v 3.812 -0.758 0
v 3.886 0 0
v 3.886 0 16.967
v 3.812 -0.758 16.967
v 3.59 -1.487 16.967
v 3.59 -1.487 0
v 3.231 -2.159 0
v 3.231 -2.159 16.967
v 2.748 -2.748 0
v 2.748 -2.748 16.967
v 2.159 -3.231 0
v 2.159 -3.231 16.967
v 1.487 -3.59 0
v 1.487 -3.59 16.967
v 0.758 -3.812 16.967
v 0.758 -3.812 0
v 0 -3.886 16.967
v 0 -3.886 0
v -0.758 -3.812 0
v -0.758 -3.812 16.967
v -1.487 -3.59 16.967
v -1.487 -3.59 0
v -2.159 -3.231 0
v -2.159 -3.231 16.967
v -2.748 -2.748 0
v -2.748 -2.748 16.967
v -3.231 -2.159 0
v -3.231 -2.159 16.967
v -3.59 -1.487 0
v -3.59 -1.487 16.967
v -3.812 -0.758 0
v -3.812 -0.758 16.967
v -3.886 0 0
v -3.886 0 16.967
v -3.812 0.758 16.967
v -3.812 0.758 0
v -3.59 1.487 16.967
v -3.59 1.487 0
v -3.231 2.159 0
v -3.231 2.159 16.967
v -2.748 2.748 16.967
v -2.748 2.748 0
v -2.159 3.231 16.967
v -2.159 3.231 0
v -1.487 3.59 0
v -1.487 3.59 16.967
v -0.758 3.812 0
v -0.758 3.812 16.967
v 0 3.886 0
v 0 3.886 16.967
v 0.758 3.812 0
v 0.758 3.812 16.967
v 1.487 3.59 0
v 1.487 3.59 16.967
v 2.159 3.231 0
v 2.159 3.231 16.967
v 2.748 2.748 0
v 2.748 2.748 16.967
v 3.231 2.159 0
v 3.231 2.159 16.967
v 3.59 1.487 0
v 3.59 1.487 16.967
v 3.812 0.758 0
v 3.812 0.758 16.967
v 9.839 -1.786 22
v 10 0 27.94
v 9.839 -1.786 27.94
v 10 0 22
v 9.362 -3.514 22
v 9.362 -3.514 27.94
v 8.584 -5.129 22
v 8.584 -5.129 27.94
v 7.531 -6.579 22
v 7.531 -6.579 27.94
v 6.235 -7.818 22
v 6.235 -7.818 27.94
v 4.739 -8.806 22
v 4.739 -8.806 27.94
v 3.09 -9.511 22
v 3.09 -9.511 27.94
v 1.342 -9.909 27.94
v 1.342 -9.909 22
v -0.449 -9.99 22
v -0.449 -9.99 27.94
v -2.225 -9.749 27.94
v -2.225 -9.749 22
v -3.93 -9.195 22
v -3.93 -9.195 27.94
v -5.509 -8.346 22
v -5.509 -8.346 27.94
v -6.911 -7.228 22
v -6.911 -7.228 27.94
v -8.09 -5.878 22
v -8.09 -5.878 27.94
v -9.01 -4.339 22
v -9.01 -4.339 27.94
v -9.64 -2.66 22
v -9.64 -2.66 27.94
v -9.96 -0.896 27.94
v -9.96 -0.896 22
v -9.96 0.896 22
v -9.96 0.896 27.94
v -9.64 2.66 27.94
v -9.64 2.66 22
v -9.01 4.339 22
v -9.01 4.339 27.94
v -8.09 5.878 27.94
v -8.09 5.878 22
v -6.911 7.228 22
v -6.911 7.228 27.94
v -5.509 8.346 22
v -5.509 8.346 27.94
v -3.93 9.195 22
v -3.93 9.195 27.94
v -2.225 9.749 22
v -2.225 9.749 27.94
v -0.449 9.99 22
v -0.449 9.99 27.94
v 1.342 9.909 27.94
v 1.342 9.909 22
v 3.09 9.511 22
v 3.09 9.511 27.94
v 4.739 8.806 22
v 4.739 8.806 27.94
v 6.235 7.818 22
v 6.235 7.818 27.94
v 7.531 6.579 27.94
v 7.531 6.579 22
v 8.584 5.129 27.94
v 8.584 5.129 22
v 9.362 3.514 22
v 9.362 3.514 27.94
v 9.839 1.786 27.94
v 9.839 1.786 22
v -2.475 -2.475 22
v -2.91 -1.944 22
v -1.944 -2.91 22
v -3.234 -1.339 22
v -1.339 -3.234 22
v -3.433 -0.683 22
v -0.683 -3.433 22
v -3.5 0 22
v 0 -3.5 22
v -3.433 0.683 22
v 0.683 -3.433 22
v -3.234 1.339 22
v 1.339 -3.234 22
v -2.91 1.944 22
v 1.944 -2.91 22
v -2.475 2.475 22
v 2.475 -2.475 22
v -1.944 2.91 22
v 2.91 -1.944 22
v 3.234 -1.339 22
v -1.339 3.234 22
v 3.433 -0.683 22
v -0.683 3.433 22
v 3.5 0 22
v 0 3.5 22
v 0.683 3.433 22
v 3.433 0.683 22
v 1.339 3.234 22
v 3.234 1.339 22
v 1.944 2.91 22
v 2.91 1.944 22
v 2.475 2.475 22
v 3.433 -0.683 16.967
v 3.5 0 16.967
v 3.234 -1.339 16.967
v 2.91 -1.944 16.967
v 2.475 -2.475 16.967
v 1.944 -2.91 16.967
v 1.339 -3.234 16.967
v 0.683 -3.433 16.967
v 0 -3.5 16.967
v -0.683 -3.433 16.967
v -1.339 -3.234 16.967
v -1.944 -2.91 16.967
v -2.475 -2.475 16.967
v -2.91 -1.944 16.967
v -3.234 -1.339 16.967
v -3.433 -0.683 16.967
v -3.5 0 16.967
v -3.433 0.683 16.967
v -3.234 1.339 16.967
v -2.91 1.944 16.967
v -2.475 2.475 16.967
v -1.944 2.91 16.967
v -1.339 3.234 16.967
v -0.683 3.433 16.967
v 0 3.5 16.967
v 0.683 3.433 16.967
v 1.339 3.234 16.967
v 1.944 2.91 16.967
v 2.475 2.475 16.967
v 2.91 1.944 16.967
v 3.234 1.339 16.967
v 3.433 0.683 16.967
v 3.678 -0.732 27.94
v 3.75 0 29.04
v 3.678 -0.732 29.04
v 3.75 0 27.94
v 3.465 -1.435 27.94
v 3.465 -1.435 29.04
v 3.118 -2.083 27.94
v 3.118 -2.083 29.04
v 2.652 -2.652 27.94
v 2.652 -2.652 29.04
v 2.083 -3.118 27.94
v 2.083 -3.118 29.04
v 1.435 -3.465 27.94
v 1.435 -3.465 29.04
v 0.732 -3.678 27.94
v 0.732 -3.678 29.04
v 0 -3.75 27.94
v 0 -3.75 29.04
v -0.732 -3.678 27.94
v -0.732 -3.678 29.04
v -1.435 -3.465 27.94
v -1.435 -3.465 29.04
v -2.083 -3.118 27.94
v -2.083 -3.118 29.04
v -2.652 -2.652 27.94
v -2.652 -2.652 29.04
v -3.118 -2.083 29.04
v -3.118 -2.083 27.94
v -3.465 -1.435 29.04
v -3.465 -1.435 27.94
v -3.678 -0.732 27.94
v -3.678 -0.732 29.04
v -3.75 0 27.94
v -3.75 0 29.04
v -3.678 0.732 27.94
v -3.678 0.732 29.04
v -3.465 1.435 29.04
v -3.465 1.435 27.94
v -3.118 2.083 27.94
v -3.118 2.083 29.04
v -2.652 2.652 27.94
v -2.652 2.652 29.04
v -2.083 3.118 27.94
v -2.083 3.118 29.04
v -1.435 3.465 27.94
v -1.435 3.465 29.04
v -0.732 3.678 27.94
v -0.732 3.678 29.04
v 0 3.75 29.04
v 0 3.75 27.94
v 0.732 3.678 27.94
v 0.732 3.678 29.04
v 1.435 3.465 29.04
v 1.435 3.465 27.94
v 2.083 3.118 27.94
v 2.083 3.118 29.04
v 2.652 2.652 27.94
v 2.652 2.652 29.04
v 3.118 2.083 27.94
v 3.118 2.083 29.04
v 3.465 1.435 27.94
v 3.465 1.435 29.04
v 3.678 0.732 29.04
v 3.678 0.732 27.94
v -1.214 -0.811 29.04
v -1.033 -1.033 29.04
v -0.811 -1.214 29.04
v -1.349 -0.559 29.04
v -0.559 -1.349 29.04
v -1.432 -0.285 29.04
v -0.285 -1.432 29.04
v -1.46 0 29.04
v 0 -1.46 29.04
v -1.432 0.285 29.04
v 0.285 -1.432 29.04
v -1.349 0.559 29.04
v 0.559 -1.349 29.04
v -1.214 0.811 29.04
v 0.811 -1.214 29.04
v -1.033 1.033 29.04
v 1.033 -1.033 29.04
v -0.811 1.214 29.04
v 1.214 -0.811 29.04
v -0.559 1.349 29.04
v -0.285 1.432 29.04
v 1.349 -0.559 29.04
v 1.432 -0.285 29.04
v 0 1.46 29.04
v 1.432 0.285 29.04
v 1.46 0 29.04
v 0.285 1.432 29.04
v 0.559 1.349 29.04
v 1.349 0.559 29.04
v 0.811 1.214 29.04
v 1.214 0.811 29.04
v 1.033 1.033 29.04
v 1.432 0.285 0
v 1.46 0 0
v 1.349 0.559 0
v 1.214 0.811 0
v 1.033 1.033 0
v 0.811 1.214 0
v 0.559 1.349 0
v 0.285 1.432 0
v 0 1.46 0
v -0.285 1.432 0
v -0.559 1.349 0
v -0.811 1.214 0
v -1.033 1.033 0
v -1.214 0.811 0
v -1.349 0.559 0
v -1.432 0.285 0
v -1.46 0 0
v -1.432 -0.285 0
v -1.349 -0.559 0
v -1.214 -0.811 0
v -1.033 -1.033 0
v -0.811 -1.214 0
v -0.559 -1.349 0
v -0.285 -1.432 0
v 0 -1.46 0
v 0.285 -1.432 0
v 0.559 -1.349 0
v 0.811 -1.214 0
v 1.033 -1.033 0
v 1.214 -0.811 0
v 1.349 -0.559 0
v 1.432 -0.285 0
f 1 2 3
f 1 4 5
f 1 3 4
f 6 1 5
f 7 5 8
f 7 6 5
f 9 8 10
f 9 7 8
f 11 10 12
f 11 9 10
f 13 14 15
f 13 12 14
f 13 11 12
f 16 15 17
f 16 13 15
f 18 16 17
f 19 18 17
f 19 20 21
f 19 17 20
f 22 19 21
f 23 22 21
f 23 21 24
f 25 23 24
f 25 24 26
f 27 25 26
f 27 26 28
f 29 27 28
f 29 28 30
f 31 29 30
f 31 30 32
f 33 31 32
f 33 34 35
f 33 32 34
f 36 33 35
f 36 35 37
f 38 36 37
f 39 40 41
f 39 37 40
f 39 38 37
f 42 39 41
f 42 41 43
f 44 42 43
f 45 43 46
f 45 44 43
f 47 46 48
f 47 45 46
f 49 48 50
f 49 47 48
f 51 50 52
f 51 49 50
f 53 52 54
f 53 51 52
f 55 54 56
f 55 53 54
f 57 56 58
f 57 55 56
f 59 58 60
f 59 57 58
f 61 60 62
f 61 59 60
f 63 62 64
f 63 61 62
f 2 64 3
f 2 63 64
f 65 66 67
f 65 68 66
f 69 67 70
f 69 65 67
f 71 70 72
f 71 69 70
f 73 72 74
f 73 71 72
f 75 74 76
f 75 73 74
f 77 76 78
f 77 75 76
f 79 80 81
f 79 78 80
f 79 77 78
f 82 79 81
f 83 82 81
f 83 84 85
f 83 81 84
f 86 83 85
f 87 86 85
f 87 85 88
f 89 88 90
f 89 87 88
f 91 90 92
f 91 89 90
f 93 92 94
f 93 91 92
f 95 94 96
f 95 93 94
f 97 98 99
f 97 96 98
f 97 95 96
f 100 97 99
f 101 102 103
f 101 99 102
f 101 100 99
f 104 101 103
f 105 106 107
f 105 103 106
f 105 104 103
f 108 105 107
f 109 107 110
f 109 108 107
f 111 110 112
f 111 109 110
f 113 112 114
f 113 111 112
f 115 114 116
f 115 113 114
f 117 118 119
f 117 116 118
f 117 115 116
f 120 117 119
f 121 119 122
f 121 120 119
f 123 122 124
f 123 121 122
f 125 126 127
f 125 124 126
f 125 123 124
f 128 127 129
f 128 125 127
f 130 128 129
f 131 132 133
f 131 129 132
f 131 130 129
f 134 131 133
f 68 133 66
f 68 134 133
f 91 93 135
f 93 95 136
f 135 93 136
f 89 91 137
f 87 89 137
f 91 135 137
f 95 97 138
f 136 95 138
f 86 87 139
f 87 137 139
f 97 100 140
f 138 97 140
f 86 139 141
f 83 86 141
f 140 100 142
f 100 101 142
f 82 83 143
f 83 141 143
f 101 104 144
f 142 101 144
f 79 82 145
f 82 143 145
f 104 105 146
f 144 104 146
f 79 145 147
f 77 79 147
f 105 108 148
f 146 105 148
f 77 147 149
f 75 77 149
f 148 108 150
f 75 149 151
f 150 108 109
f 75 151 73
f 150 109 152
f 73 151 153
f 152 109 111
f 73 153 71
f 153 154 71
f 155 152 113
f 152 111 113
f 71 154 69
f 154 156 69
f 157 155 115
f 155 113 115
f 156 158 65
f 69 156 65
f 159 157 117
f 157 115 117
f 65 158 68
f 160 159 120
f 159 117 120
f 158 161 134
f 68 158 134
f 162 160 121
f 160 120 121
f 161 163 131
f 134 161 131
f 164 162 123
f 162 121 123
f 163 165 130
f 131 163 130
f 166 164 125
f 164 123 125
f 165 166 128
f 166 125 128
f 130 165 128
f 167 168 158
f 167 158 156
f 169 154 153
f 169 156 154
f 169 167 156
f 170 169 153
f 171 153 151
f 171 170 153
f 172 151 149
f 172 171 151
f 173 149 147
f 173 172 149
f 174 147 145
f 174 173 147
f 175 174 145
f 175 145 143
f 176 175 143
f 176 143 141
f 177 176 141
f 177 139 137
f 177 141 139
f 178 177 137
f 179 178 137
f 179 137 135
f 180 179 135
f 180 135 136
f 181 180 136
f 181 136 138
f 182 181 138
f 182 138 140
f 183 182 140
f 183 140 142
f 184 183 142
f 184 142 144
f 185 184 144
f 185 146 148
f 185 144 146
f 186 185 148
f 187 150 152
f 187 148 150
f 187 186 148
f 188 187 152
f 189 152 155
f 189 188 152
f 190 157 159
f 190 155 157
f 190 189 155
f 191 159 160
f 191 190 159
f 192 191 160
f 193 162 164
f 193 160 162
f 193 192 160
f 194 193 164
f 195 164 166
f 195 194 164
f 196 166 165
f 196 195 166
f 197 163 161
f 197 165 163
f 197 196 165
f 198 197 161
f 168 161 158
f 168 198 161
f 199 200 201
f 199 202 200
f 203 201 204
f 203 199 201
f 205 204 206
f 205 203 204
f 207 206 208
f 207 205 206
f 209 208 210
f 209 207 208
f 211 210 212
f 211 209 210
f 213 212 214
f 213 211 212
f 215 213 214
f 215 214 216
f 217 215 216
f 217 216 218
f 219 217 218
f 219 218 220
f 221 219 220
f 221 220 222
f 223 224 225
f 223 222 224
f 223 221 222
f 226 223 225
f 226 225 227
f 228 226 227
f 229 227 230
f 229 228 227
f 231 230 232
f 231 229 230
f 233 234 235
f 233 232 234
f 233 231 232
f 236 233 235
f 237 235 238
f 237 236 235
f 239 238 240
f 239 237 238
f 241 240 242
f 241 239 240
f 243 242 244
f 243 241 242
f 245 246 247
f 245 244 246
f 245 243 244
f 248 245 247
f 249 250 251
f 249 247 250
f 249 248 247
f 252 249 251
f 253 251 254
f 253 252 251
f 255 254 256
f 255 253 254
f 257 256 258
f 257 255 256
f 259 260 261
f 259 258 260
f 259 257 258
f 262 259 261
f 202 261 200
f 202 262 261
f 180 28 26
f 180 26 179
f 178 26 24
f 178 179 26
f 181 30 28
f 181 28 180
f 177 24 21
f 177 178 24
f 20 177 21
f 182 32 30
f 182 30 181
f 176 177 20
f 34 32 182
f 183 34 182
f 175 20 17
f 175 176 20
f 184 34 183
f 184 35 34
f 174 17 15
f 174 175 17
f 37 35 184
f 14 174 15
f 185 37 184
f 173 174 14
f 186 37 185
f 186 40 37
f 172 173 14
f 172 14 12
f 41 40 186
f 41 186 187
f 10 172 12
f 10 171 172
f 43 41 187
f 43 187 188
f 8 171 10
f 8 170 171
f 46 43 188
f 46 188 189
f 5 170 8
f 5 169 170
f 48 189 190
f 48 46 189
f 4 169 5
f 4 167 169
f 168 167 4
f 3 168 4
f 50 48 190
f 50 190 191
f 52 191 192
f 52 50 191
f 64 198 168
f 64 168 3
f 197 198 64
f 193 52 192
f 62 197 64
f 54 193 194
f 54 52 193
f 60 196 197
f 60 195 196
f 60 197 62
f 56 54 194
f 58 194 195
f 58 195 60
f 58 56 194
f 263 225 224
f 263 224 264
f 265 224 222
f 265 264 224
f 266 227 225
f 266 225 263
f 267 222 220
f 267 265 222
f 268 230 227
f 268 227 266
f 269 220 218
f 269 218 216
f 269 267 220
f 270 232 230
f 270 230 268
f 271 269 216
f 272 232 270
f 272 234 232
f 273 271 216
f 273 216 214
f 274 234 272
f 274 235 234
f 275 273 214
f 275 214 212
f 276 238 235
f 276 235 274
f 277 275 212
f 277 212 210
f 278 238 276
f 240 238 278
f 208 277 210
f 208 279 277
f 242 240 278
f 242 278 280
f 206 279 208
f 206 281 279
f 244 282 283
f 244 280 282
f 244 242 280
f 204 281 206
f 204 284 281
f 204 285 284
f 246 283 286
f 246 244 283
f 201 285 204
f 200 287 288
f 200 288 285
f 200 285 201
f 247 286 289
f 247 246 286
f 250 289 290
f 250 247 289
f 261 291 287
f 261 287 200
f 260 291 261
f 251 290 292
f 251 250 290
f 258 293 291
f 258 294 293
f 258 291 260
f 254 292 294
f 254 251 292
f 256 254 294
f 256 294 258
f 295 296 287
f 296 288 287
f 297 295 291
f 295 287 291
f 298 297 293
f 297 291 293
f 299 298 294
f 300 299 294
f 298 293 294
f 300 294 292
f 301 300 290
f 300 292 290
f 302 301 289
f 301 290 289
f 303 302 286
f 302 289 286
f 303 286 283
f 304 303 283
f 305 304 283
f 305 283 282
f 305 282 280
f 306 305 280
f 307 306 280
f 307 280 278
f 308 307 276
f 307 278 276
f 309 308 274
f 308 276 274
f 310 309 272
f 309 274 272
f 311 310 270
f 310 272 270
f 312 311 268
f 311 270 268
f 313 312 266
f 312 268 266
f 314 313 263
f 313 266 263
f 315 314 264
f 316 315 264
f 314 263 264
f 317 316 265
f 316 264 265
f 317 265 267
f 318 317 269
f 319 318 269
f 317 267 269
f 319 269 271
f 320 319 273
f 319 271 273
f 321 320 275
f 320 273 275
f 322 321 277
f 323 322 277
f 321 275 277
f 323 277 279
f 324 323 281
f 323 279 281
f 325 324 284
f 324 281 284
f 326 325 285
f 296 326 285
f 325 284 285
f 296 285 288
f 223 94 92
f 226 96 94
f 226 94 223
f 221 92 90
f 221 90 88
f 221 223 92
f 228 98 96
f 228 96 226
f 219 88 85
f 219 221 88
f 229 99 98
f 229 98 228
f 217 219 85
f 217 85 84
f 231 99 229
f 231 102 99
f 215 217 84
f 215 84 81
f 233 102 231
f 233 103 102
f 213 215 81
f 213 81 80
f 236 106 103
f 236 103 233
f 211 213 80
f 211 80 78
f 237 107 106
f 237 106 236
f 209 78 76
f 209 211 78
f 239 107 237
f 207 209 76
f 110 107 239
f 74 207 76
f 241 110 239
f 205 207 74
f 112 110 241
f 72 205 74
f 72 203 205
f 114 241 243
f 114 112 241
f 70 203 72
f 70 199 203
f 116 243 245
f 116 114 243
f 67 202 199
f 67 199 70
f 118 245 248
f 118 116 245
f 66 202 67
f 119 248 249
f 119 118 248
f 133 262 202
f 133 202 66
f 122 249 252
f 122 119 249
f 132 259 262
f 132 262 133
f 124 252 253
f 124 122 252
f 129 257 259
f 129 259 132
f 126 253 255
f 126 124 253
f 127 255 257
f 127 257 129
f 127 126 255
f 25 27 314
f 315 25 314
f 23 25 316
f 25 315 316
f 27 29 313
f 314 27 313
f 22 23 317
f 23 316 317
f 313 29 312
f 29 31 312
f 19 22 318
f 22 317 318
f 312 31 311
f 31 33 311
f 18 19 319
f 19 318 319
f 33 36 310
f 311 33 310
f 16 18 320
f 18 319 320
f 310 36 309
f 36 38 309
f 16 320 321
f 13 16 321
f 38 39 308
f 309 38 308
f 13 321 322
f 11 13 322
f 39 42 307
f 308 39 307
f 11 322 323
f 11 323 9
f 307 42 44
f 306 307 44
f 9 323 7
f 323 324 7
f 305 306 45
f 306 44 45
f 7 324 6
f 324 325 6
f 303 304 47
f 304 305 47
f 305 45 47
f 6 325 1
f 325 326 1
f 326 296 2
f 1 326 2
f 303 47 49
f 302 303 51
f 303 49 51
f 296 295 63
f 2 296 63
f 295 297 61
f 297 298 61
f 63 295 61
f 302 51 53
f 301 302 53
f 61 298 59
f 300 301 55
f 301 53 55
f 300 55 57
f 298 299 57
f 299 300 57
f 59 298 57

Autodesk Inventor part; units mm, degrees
ref_plane "YZ Plane" through (0, 0, 0) normal (1, 0, 0) x (0, 1, 0)
ref_plane "XZ Plane" through (0, 0, 0) normal (0, 1, 0) x (-1, 0, 0)
ref_plane "XY Plane" through (0, 0, 0) normal (0, 0, 1) x (1, 0, 0)
sketch "Sketch1" plane through (0, 0, 0) normal (0, 0, 1) x (1, 0, 0)
  circle A0 centre (0, 0) radius 3.8862
  dimension "d0" = 7.7724
extrude "Extrusion1" add sketch "Sketch1" along normal blind 16.9672
sketch "Sketch2" plane through (0, 0, 16.9672) normal (0, 0, 1) x (1, 0, 0)
  circle A0 centre (0, 0) radius 3.8862 projected
  circle A1 centre (0, 0) radius 3.5
  dimension "d4" = 7
extrude "Extrusion2" add sketch "Sketch2" along normal blind 5.0328 contours A1
sketch "Sketch3" plane through (0, 0, 22) normal (0, 0, 1) x (1, 0, 0)
  circle A0 centre (0, 0) radius 3.5 projected
  circle A1 centre (0, 0) radius 10
  dimension "d8" = 20
extrude "Extrusion3" add sketch "Sketch3" along normal blind 5.94 contours A0 | A1
sketch "Sketch4" plane through (0, 0, 27.94) normal (0, 0, 1) x (1, 0, 0)
  circle A0 centre (0, 0) radius 10 projected
  circle A1 centre (0, 0) radius 3.75
  dimension "d13" = 7.5
extrude "Extrusion4" add sketch "Sketch4" along normal blind 1.1 contours A1
sketch "Sketch5" plane through (0, 0, 29.04) normal (0, 0, 1) x (1, 0, 0)
  circle A0 centre (0, 0) radius 3.75 projected
  circle A1 centre (0, 0) radius 1.4605
  dimension "d18" = 2.921
extrude "Extrusion5" cut sketch "Sketch5" against normal up to next contours A1
properties part number "stator"
